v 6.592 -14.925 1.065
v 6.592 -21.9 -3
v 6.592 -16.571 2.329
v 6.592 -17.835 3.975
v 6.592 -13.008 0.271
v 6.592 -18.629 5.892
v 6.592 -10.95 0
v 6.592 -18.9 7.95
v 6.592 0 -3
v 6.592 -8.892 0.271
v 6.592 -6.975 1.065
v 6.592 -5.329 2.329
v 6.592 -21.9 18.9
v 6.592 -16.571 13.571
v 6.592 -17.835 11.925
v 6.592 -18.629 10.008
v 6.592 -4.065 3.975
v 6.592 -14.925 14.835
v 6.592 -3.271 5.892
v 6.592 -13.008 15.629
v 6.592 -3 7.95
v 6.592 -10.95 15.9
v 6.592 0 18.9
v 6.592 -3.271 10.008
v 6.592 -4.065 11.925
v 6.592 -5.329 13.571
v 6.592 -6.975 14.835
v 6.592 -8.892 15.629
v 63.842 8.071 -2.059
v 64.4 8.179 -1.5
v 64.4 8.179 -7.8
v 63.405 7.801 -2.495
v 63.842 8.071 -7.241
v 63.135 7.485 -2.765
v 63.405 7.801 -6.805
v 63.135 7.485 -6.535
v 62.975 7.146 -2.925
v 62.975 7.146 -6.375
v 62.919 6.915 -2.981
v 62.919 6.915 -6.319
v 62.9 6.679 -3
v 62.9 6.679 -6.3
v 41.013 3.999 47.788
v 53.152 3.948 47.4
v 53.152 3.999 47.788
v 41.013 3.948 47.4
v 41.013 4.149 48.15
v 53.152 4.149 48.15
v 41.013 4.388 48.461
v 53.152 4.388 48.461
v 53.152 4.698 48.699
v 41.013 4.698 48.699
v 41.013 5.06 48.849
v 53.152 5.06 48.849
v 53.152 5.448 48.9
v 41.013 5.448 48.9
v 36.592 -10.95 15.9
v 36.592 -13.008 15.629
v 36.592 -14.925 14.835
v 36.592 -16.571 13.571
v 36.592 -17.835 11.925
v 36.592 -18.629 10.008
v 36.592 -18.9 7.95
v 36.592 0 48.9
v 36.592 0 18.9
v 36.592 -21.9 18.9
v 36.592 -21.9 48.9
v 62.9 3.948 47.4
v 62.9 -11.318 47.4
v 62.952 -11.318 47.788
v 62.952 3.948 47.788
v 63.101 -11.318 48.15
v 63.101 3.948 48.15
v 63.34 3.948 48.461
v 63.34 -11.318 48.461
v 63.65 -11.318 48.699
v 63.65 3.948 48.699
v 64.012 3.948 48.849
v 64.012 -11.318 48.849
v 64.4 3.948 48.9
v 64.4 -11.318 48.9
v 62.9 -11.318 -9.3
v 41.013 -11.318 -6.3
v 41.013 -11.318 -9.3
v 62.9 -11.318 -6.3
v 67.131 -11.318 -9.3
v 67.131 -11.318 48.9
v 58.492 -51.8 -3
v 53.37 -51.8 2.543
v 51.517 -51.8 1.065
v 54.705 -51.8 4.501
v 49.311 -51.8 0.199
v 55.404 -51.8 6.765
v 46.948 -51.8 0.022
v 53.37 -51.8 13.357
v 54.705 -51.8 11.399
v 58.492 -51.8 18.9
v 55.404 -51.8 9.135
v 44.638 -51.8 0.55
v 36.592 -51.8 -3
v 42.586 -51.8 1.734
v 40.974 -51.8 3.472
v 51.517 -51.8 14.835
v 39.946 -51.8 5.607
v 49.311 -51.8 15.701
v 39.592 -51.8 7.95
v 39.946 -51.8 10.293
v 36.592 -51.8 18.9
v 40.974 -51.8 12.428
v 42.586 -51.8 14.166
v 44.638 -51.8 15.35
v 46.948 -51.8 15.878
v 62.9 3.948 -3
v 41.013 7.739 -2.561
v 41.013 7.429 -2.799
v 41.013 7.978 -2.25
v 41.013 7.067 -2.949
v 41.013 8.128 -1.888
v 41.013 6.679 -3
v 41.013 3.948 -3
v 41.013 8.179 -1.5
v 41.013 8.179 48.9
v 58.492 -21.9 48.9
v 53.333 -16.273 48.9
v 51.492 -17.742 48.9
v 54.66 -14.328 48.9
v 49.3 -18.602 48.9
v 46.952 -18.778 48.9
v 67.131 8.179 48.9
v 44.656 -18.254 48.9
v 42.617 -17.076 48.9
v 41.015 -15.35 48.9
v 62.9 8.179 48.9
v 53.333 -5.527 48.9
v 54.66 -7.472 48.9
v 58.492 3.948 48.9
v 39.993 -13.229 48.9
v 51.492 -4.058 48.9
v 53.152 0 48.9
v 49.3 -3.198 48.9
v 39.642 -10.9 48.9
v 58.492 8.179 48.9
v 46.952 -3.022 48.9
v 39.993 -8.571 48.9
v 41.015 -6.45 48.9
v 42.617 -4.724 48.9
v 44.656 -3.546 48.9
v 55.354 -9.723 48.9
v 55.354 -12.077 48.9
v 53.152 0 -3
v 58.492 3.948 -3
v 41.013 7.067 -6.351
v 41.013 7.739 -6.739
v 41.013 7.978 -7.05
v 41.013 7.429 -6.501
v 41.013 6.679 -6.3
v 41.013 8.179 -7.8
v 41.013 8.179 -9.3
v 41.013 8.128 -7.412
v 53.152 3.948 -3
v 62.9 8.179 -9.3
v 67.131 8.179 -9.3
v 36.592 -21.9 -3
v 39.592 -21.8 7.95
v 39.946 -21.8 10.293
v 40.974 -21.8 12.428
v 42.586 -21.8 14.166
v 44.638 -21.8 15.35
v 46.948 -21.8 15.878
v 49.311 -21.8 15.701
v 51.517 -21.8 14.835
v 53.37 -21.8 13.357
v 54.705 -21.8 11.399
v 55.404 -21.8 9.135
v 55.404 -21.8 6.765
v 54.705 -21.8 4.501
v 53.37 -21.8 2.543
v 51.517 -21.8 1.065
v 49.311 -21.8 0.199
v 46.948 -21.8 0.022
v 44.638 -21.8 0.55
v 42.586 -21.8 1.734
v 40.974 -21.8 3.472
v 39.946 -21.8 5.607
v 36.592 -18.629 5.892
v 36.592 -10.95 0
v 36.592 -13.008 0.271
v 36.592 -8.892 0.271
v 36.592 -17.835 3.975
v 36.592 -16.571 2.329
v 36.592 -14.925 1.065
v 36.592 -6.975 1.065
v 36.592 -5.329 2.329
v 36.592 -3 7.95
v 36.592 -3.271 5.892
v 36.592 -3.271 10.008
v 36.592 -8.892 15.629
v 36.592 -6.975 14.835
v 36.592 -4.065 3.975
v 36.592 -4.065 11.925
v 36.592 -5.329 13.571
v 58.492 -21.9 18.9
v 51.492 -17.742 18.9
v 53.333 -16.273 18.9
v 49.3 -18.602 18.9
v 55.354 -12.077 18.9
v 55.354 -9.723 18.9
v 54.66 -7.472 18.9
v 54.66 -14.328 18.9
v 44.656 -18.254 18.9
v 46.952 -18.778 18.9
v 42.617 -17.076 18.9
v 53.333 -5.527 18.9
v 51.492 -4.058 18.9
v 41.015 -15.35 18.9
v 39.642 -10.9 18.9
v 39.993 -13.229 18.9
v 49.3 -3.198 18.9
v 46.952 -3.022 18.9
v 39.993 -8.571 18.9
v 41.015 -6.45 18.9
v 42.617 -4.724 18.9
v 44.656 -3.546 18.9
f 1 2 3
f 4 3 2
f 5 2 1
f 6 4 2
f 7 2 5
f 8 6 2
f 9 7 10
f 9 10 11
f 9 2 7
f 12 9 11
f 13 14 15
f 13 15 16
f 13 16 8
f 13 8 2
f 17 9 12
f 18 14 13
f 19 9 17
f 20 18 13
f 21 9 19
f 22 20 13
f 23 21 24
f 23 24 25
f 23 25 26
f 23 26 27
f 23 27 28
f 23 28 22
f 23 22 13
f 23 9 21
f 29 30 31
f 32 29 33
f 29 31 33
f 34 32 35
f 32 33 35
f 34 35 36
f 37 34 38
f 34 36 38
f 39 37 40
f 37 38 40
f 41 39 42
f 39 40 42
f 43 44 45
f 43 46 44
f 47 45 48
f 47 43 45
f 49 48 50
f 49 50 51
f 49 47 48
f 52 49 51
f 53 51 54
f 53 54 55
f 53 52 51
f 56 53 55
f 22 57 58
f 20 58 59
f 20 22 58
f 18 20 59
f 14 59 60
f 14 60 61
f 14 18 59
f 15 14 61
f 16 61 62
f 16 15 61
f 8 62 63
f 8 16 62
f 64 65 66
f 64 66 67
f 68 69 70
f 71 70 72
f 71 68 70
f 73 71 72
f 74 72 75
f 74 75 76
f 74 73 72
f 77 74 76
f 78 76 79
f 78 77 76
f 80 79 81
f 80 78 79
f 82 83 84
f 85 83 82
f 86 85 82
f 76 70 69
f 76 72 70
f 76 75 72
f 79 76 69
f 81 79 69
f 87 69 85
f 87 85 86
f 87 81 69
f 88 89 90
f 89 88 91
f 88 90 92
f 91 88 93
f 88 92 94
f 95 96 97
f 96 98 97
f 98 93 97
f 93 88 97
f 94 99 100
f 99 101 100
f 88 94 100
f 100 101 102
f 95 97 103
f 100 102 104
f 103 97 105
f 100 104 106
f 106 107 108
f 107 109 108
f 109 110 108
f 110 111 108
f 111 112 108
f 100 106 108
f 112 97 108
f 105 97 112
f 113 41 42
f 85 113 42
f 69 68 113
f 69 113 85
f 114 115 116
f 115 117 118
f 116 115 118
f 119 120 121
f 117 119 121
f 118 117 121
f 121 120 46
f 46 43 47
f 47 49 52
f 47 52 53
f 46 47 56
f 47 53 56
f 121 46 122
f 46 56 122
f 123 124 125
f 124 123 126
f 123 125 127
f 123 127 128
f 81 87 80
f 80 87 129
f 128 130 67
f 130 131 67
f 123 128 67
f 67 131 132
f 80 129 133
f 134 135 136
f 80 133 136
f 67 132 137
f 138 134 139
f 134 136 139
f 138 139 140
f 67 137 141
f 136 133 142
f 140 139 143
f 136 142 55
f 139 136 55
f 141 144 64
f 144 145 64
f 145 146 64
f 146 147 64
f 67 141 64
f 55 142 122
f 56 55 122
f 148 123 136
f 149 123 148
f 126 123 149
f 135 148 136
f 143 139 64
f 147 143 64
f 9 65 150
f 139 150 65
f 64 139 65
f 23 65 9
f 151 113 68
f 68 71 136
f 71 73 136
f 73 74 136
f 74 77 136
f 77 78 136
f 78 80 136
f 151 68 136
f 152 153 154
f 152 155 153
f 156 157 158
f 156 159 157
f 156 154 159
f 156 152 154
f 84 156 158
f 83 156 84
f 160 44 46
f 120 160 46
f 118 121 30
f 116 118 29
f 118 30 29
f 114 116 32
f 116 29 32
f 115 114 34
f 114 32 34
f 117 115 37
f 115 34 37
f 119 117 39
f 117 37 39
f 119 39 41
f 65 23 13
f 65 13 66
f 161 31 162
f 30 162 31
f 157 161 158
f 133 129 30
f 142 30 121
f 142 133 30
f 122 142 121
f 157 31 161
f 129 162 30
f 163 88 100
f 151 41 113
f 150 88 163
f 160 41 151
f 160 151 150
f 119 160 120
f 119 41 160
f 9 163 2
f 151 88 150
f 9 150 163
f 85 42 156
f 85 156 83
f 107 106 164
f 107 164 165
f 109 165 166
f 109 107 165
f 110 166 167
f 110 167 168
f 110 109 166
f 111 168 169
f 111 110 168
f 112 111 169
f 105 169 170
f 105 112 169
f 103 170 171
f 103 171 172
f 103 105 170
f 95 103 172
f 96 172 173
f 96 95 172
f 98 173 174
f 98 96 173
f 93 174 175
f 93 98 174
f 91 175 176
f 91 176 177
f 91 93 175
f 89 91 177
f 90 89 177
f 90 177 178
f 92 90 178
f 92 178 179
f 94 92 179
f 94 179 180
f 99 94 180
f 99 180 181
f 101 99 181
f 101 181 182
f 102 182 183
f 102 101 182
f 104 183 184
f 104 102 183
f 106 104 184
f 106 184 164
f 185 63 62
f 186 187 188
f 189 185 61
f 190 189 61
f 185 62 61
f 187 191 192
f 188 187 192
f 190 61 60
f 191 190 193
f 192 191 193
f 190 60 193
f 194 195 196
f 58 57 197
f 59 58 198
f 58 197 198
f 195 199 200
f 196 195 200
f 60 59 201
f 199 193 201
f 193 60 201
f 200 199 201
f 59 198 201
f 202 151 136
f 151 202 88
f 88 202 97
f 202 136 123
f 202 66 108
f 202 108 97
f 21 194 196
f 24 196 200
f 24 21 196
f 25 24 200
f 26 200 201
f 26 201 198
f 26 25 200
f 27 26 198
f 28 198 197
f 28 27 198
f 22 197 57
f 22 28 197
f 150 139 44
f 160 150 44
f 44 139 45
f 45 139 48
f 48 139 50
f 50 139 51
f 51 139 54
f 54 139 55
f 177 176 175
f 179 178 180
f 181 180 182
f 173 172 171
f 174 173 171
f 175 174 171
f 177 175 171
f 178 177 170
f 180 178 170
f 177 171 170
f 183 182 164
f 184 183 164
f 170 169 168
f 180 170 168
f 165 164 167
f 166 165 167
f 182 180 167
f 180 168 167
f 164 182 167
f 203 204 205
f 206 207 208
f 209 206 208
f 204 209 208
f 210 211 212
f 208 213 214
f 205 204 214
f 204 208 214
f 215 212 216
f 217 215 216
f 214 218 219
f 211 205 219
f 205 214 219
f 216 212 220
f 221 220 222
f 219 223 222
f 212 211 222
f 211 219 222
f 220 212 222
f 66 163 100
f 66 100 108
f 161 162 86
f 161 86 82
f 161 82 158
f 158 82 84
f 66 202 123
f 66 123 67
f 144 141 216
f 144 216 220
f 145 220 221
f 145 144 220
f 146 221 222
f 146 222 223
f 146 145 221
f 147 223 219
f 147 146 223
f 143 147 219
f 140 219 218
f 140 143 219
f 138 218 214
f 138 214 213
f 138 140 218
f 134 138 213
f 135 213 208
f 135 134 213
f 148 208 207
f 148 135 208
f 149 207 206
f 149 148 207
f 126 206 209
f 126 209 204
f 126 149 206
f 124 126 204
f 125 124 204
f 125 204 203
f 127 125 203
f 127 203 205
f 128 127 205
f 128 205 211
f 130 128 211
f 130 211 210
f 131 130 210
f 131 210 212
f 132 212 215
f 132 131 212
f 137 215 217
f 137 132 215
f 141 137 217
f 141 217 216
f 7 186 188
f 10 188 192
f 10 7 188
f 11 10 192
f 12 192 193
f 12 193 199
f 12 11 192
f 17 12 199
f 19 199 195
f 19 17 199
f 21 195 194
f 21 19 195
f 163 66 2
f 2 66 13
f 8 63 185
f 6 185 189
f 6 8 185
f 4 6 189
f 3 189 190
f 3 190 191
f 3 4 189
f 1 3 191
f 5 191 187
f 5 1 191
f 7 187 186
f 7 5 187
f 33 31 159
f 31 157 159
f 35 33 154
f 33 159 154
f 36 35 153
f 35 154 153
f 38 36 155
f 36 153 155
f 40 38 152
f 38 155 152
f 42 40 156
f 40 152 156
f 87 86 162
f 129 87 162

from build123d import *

# Parameters (mm, degrees)
F0_W      = 27
F0_H      = 15.9
F0_W_2    = 15.9
F0_H_2    = 27
F0_W_3    = 3
F0_H_3    = 3
F1_DEPTH  = 21.9
F2_DEPTH  = 51.8
F3_R      = 7.95
F6_DEPTH  = 30
F7_DEPTH  = 30
F4_R      = 7.9
F8_DEPTH  = 30
F10_W     = 4.4081552195
F10_H     = 4.2303893715
F11_DEPTH = 51.9
F13_DEPTH = 6.3
F14_W     = 19.4965768605
F14_H     = 3
F15_DEPTH = 26.1180568486
F16_R     = 1.5


with BuildPart() as f1:
    # F0 (on Front) → F1 (new body)
    with BuildSketch(Plane.XZ):
        with BuildLine():
            Line((-34.3576915575, 15.9), (-42.3076915575, 15.9))
            Line((-42.3076915575, 15.9), (-42.3076915575, 7.9499999931))
            ThreePointArc((-42.3076915575, 7.9499999931), (-39.9791904704, 13.571498908), (-34.3576915575, 15.9))
        make_face()
        with BuildLine():
            ThreePointArc((-34.3576915575, 15.9), (-39.9791904704, 13.571498908), (-42.3076915575, 7.9499999931))
            ThreePointArc((-42.3076915575, 7.9499999931), (-39.9791904655, 2.3285010871), (-34.3576915575, 0))
            ThreePointArc((-34.3576915575, 0), (-28.7361926471, 2.3285010896), (-26.4076915575, 7.95))
            ThreePointArc((-26.4076915575, 7.95), (-28.7361926471, 13.5714989104), (-34.3576915575, 15.9))
        make_face()
        Polygon((-42.3076915575, 18.9), (-42.3076915575, 45.9), (-26.4076915575, 45.9), (-26.4076915575, 18.9), (-23.4076915575, 18.9), (-23.4076915575, 48.9), (-45.3076915575, 48.9), (-45.3076915575, 18.9), align=None)
        with Locations((-9.9076915575, 7.95)):
            Rectangle(F0_W, F0_H)
        with Locations((-34.3576915575, 32.4)):
            Rectangle(F0_W_2, F0_H_2)
        with BuildLine():
            ThreePointArc((-34.3576915575, 0), (-39.9791904655, 2.3285010871), (-42.3076915575, 7.9499999931))
            Line((-42.3076915575, 7.9499999931), (-42.3076915575, 0))
            Line((-42.3076915575, 0), (-34.3576915575, 0))
        make_face()
        with BuildLine():
            Line((-26.4076915575, 0), (-26.4076915575, 7.95))
            ThreePointArc((-26.4076915575, 7.95), (-28.7361926471, 2.3285010896), (-34.3576915575, 0))
            Line((-34.3576915575, 0), (-26.4076915575, 0))
        make_face()
        with BuildLine():
            Line((-26.4076915575, 7.95), (-26.4076915575, 15.9))
            Line((-26.4076915575, 15.9), (-34.3576915575, 15.9))
            ThreePointArc((-34.3576915575, 15.9), (-28.7361926471, 13.5714989104), (-26.4076915575, 7.95))
        make_face()
        Polygon((6.5923084425, 18.9), (-23.4076915575, 18.9), (-23.4076915575, 15.9), (3.5923084425, 15.9), (3.5923084425, 0), (-23.4076915575, 0), (-23.4076915575, -3), (6.5923084425, -3), align=None)
        Polygon((-26.4076915575, 18.9), (-42.3076915575, 18.9), (-42.3076915575, 15.9), (-34.3576915575, 15.9), (-26.4076915575, 15.9), align=None)
        Polygon((-23.4076915575, 15.9), (-26.4076915575, 15.9), (-26.4076915575, 7.95), (-26.4076915575, 0), (-23.4076915575, 0), align=None)
        Polygon((-42.3076915575, 15.9), (-42.3076915575, 18.9), (-45.3076915575, 18.9), (-45.3076915575, -3), (-23.4076915575, -3), (-23.4076915575, 0), (-26.4076915575, 0), (-34.3576915575, 0), (-42.3076915575, 0), (-42.3076915575, 7.9499999931), align=None)
        with Locations((-24.9076915575, 17.4)):
            Rectangle(F0_W_3, F0_H_3)
    extrude(amount=F1_DEPTH)

    # F0 (on Front) → F2 (join)
    with BuildSketch(Plane.XZ):
        Polygon((-42.3076915575, 15.9), (-42.3076915575, 18.9), (-45.3076915575, 18.9), (-45.3076915575, -3), (-23.4076915575, -3), (-23.4076915575, 0), (-26.4076915575, 0), (-34.3576915575, 0), (-42.3076915575, 0), (-42.3076915575, 7.9499999931), align=None)
        with BuildLine():
            ThreePointArc((-34.3576915575, 15.9), (-39.9791904704, 13.571498908), (-42.3076915575, 7.9499999931))
            ThreePointArc((-42.3076915575, 7.9499999931), (-39.9791904655, 2.3285010871), (-34.3576915575, 0))
            ThreePointArc((-34.3576915575, 0), (-28.7361926471, 2.3285010896), (-26.4076915575, 7.95))
            ThreePointArc((-26.4076915575, 7.95), (-28.7361926471, 13.5714989104), (-34.3576915575, 15.9))
        make_face()
        Polygon((-26.4076915575, 18.9), (-42.3076915575, 18.9), (-42.3076915575, 15.9), (-34.3576915575, 15.9), (-26.4076915575, 15.9), align=None)
        Polygon((-23.4076915575, 15.9), (-26.4076915575, 15.9), (-26.4076915575, 7.95), (-26.4076915575, 0), (-23.4076915575, 0), align=None)
        with Locations((-24.9076915575, 17.4)):
            Rectangle(F0_W_3, F0_H_3)
        with BuildLine():
            Line((-26.4076915575, 7.95), (-26.4076915575, 15.9))
            Line((-26.4076915575, 15.9), (-34.3576915575, 15.9))
            ThreePointArc((-34.3576915575, 15.9), (-28.7361926471, 13.5714989104), (-26.4076915575, 7.95))
        make_face()
        with BuildLine():
            Line((-34.3576915575, 15.9), (-42.3076915575, 15.9))
            Line((-42.3076915575, 15.9), (-42.3076915575, 7.9499999931))
            ThreePointArc((-42.3076915575, 7.9499999931), (-39.9791904704, 13.571498908), (-34.3576915575, 15.9))
        make_face()
        with BuildLine():
            ThreePointArc((-34.3576915575, 0), (-39.9791904655, 2.3285010871), (-42.3076915575, 7.9499999931))
            Line((-42.3076915575, 7.9499999931), (-42.3076915575, 0))
            Line((-42.3076915575, 0), (-34.3576915575, 0))
        make_face()
        with BuildLine():
            Line((-26.4076915575, 0), (-26.4076915575, 7.95))
            ThreePointArc((-26.4076915575, 7.95), (-28.7361926471, 2.3285010896), (-34.3576915575, 0))
            Line((-34.3576915575, 0), (-26.4076915575, 0))
        make_face()
    extrude(amount=F2_DEPTH)

    # F3 (on face) → F6 (cut)
    with BuildSketch(Plane.XZ.offset(51.8)):
        with Locations((-34.3576915575, 7.95)):
            Circle(F3_R)
    extrude(amount=-F6_DEPTH, mode=Mode.SUBTRACT)

    # F5 (on face) → F7 (cut)
    with BuildSketch(Plane.YZ.offset(6.5923084425)):
        with BuildLine():
            ThreePointArc((-3, 7.95), (-5.3285010896, 13.5714989104), (-10.95, 15.9))
            ThreePointArc((-10.95, 15.9), (-16.5714989104, 13.5714989104), (-18.9, 7.95))
            ThreePointArc((-18.9, 7.95), (-16.5714989104, 2.3285010896), (-10.95, 0))
            ThreePointArc((-10.95, 0), (-5.3285010896, 2.3285010896), (-3, 7.95))
        make_face()
    extrude(amount=-F7_DEPTH, mode=Mode.SUBTRACT)

    # F4 (on face) → F8 (cut)
    with BuildSketch(Plane.XY.offset(48.9)):
        with Locations((-34.3576915575, -10.9)):
            Circle(F4_R)
    extrude(amount=-F8_DEPTH, mode=Mode.SUBTRACT)

    # F10 (on face) → F11 (join)
    with BuildSketch(Plane.XY.offset(48.9)):
        Polygon((-49.715846777, -11.3178612664), (-49.715846777, 3.9483262226), (-49.715846777, 8.1787155941), (-53.9462342858, 8.1787155941), (-53.9462342858, -11.3178612664), align=None)
        with Locations((-47.5117691672, 6.0635209084)):
            Rectangle(F10_W, F10_H)
        Polygon((-45.3076915575, 3.9483262226), (-45.3076915575, 0), (-39.9675555527, 0), (-39.9675555527, 3.9483262226), (-27.8281774372, 3.9483262226), (-27.8281774372, 8.1787155941), (-45.3076915575, 8.1787155941), align=None)
    extrude(amount=-F11_DEPTH)

    # F12 (on face) → F13 (join)
    with BuildSketch(Plane(origin=(0, 0, -3), x_dir=(1, 0, 0), z_dir=(0, 0, -1))):
        Polygon((-49.715846777, -8.1787155941), (-49.715846777, -3.9483262226), (-49.715846777, 11.3178612664), (-53.9462342858, 11.3178612664), (-53.9462342858, -8.1787155941), align=None)
    extrude(amount=F13_DEPTH)

    # F14 (on face) → F15 (join, through all)
    with BuildSketch(Plane(origin=(-53.9462342858, 0, 0), x_dir=(0, -1, 0), z_dir=(-1, 0, 0))):
        with Locations((1.5695728362, -7.8)):
            Rectangle(F14_W, F14_H)
    extrude(amount=-F15_DEPTH)

    # F16
    f16_edges = [f1.edges().sort_by_distance(p)[0] for p in [
        (-38.772012, 8.178716, -6.3),
        (-38.772012, 8.178716, -3),
        (-33.897866, 3.948326, 48.9),
        (-49.715847, -3.684768, 48.9),
        (-49.715847, 8.178716, -4.65),
    ]]
    fillet(f16_edges, radius=F16_R)


with BuildPart() as f17_1:
    # F17: instance of F1
    add(f1.part.mirror(Plane(origin=(6.5923084425, -10.95, 7.95), x_dir=(0, 1, 0), z_dir=(1, 0, 0))))


solid = f17_1.part
